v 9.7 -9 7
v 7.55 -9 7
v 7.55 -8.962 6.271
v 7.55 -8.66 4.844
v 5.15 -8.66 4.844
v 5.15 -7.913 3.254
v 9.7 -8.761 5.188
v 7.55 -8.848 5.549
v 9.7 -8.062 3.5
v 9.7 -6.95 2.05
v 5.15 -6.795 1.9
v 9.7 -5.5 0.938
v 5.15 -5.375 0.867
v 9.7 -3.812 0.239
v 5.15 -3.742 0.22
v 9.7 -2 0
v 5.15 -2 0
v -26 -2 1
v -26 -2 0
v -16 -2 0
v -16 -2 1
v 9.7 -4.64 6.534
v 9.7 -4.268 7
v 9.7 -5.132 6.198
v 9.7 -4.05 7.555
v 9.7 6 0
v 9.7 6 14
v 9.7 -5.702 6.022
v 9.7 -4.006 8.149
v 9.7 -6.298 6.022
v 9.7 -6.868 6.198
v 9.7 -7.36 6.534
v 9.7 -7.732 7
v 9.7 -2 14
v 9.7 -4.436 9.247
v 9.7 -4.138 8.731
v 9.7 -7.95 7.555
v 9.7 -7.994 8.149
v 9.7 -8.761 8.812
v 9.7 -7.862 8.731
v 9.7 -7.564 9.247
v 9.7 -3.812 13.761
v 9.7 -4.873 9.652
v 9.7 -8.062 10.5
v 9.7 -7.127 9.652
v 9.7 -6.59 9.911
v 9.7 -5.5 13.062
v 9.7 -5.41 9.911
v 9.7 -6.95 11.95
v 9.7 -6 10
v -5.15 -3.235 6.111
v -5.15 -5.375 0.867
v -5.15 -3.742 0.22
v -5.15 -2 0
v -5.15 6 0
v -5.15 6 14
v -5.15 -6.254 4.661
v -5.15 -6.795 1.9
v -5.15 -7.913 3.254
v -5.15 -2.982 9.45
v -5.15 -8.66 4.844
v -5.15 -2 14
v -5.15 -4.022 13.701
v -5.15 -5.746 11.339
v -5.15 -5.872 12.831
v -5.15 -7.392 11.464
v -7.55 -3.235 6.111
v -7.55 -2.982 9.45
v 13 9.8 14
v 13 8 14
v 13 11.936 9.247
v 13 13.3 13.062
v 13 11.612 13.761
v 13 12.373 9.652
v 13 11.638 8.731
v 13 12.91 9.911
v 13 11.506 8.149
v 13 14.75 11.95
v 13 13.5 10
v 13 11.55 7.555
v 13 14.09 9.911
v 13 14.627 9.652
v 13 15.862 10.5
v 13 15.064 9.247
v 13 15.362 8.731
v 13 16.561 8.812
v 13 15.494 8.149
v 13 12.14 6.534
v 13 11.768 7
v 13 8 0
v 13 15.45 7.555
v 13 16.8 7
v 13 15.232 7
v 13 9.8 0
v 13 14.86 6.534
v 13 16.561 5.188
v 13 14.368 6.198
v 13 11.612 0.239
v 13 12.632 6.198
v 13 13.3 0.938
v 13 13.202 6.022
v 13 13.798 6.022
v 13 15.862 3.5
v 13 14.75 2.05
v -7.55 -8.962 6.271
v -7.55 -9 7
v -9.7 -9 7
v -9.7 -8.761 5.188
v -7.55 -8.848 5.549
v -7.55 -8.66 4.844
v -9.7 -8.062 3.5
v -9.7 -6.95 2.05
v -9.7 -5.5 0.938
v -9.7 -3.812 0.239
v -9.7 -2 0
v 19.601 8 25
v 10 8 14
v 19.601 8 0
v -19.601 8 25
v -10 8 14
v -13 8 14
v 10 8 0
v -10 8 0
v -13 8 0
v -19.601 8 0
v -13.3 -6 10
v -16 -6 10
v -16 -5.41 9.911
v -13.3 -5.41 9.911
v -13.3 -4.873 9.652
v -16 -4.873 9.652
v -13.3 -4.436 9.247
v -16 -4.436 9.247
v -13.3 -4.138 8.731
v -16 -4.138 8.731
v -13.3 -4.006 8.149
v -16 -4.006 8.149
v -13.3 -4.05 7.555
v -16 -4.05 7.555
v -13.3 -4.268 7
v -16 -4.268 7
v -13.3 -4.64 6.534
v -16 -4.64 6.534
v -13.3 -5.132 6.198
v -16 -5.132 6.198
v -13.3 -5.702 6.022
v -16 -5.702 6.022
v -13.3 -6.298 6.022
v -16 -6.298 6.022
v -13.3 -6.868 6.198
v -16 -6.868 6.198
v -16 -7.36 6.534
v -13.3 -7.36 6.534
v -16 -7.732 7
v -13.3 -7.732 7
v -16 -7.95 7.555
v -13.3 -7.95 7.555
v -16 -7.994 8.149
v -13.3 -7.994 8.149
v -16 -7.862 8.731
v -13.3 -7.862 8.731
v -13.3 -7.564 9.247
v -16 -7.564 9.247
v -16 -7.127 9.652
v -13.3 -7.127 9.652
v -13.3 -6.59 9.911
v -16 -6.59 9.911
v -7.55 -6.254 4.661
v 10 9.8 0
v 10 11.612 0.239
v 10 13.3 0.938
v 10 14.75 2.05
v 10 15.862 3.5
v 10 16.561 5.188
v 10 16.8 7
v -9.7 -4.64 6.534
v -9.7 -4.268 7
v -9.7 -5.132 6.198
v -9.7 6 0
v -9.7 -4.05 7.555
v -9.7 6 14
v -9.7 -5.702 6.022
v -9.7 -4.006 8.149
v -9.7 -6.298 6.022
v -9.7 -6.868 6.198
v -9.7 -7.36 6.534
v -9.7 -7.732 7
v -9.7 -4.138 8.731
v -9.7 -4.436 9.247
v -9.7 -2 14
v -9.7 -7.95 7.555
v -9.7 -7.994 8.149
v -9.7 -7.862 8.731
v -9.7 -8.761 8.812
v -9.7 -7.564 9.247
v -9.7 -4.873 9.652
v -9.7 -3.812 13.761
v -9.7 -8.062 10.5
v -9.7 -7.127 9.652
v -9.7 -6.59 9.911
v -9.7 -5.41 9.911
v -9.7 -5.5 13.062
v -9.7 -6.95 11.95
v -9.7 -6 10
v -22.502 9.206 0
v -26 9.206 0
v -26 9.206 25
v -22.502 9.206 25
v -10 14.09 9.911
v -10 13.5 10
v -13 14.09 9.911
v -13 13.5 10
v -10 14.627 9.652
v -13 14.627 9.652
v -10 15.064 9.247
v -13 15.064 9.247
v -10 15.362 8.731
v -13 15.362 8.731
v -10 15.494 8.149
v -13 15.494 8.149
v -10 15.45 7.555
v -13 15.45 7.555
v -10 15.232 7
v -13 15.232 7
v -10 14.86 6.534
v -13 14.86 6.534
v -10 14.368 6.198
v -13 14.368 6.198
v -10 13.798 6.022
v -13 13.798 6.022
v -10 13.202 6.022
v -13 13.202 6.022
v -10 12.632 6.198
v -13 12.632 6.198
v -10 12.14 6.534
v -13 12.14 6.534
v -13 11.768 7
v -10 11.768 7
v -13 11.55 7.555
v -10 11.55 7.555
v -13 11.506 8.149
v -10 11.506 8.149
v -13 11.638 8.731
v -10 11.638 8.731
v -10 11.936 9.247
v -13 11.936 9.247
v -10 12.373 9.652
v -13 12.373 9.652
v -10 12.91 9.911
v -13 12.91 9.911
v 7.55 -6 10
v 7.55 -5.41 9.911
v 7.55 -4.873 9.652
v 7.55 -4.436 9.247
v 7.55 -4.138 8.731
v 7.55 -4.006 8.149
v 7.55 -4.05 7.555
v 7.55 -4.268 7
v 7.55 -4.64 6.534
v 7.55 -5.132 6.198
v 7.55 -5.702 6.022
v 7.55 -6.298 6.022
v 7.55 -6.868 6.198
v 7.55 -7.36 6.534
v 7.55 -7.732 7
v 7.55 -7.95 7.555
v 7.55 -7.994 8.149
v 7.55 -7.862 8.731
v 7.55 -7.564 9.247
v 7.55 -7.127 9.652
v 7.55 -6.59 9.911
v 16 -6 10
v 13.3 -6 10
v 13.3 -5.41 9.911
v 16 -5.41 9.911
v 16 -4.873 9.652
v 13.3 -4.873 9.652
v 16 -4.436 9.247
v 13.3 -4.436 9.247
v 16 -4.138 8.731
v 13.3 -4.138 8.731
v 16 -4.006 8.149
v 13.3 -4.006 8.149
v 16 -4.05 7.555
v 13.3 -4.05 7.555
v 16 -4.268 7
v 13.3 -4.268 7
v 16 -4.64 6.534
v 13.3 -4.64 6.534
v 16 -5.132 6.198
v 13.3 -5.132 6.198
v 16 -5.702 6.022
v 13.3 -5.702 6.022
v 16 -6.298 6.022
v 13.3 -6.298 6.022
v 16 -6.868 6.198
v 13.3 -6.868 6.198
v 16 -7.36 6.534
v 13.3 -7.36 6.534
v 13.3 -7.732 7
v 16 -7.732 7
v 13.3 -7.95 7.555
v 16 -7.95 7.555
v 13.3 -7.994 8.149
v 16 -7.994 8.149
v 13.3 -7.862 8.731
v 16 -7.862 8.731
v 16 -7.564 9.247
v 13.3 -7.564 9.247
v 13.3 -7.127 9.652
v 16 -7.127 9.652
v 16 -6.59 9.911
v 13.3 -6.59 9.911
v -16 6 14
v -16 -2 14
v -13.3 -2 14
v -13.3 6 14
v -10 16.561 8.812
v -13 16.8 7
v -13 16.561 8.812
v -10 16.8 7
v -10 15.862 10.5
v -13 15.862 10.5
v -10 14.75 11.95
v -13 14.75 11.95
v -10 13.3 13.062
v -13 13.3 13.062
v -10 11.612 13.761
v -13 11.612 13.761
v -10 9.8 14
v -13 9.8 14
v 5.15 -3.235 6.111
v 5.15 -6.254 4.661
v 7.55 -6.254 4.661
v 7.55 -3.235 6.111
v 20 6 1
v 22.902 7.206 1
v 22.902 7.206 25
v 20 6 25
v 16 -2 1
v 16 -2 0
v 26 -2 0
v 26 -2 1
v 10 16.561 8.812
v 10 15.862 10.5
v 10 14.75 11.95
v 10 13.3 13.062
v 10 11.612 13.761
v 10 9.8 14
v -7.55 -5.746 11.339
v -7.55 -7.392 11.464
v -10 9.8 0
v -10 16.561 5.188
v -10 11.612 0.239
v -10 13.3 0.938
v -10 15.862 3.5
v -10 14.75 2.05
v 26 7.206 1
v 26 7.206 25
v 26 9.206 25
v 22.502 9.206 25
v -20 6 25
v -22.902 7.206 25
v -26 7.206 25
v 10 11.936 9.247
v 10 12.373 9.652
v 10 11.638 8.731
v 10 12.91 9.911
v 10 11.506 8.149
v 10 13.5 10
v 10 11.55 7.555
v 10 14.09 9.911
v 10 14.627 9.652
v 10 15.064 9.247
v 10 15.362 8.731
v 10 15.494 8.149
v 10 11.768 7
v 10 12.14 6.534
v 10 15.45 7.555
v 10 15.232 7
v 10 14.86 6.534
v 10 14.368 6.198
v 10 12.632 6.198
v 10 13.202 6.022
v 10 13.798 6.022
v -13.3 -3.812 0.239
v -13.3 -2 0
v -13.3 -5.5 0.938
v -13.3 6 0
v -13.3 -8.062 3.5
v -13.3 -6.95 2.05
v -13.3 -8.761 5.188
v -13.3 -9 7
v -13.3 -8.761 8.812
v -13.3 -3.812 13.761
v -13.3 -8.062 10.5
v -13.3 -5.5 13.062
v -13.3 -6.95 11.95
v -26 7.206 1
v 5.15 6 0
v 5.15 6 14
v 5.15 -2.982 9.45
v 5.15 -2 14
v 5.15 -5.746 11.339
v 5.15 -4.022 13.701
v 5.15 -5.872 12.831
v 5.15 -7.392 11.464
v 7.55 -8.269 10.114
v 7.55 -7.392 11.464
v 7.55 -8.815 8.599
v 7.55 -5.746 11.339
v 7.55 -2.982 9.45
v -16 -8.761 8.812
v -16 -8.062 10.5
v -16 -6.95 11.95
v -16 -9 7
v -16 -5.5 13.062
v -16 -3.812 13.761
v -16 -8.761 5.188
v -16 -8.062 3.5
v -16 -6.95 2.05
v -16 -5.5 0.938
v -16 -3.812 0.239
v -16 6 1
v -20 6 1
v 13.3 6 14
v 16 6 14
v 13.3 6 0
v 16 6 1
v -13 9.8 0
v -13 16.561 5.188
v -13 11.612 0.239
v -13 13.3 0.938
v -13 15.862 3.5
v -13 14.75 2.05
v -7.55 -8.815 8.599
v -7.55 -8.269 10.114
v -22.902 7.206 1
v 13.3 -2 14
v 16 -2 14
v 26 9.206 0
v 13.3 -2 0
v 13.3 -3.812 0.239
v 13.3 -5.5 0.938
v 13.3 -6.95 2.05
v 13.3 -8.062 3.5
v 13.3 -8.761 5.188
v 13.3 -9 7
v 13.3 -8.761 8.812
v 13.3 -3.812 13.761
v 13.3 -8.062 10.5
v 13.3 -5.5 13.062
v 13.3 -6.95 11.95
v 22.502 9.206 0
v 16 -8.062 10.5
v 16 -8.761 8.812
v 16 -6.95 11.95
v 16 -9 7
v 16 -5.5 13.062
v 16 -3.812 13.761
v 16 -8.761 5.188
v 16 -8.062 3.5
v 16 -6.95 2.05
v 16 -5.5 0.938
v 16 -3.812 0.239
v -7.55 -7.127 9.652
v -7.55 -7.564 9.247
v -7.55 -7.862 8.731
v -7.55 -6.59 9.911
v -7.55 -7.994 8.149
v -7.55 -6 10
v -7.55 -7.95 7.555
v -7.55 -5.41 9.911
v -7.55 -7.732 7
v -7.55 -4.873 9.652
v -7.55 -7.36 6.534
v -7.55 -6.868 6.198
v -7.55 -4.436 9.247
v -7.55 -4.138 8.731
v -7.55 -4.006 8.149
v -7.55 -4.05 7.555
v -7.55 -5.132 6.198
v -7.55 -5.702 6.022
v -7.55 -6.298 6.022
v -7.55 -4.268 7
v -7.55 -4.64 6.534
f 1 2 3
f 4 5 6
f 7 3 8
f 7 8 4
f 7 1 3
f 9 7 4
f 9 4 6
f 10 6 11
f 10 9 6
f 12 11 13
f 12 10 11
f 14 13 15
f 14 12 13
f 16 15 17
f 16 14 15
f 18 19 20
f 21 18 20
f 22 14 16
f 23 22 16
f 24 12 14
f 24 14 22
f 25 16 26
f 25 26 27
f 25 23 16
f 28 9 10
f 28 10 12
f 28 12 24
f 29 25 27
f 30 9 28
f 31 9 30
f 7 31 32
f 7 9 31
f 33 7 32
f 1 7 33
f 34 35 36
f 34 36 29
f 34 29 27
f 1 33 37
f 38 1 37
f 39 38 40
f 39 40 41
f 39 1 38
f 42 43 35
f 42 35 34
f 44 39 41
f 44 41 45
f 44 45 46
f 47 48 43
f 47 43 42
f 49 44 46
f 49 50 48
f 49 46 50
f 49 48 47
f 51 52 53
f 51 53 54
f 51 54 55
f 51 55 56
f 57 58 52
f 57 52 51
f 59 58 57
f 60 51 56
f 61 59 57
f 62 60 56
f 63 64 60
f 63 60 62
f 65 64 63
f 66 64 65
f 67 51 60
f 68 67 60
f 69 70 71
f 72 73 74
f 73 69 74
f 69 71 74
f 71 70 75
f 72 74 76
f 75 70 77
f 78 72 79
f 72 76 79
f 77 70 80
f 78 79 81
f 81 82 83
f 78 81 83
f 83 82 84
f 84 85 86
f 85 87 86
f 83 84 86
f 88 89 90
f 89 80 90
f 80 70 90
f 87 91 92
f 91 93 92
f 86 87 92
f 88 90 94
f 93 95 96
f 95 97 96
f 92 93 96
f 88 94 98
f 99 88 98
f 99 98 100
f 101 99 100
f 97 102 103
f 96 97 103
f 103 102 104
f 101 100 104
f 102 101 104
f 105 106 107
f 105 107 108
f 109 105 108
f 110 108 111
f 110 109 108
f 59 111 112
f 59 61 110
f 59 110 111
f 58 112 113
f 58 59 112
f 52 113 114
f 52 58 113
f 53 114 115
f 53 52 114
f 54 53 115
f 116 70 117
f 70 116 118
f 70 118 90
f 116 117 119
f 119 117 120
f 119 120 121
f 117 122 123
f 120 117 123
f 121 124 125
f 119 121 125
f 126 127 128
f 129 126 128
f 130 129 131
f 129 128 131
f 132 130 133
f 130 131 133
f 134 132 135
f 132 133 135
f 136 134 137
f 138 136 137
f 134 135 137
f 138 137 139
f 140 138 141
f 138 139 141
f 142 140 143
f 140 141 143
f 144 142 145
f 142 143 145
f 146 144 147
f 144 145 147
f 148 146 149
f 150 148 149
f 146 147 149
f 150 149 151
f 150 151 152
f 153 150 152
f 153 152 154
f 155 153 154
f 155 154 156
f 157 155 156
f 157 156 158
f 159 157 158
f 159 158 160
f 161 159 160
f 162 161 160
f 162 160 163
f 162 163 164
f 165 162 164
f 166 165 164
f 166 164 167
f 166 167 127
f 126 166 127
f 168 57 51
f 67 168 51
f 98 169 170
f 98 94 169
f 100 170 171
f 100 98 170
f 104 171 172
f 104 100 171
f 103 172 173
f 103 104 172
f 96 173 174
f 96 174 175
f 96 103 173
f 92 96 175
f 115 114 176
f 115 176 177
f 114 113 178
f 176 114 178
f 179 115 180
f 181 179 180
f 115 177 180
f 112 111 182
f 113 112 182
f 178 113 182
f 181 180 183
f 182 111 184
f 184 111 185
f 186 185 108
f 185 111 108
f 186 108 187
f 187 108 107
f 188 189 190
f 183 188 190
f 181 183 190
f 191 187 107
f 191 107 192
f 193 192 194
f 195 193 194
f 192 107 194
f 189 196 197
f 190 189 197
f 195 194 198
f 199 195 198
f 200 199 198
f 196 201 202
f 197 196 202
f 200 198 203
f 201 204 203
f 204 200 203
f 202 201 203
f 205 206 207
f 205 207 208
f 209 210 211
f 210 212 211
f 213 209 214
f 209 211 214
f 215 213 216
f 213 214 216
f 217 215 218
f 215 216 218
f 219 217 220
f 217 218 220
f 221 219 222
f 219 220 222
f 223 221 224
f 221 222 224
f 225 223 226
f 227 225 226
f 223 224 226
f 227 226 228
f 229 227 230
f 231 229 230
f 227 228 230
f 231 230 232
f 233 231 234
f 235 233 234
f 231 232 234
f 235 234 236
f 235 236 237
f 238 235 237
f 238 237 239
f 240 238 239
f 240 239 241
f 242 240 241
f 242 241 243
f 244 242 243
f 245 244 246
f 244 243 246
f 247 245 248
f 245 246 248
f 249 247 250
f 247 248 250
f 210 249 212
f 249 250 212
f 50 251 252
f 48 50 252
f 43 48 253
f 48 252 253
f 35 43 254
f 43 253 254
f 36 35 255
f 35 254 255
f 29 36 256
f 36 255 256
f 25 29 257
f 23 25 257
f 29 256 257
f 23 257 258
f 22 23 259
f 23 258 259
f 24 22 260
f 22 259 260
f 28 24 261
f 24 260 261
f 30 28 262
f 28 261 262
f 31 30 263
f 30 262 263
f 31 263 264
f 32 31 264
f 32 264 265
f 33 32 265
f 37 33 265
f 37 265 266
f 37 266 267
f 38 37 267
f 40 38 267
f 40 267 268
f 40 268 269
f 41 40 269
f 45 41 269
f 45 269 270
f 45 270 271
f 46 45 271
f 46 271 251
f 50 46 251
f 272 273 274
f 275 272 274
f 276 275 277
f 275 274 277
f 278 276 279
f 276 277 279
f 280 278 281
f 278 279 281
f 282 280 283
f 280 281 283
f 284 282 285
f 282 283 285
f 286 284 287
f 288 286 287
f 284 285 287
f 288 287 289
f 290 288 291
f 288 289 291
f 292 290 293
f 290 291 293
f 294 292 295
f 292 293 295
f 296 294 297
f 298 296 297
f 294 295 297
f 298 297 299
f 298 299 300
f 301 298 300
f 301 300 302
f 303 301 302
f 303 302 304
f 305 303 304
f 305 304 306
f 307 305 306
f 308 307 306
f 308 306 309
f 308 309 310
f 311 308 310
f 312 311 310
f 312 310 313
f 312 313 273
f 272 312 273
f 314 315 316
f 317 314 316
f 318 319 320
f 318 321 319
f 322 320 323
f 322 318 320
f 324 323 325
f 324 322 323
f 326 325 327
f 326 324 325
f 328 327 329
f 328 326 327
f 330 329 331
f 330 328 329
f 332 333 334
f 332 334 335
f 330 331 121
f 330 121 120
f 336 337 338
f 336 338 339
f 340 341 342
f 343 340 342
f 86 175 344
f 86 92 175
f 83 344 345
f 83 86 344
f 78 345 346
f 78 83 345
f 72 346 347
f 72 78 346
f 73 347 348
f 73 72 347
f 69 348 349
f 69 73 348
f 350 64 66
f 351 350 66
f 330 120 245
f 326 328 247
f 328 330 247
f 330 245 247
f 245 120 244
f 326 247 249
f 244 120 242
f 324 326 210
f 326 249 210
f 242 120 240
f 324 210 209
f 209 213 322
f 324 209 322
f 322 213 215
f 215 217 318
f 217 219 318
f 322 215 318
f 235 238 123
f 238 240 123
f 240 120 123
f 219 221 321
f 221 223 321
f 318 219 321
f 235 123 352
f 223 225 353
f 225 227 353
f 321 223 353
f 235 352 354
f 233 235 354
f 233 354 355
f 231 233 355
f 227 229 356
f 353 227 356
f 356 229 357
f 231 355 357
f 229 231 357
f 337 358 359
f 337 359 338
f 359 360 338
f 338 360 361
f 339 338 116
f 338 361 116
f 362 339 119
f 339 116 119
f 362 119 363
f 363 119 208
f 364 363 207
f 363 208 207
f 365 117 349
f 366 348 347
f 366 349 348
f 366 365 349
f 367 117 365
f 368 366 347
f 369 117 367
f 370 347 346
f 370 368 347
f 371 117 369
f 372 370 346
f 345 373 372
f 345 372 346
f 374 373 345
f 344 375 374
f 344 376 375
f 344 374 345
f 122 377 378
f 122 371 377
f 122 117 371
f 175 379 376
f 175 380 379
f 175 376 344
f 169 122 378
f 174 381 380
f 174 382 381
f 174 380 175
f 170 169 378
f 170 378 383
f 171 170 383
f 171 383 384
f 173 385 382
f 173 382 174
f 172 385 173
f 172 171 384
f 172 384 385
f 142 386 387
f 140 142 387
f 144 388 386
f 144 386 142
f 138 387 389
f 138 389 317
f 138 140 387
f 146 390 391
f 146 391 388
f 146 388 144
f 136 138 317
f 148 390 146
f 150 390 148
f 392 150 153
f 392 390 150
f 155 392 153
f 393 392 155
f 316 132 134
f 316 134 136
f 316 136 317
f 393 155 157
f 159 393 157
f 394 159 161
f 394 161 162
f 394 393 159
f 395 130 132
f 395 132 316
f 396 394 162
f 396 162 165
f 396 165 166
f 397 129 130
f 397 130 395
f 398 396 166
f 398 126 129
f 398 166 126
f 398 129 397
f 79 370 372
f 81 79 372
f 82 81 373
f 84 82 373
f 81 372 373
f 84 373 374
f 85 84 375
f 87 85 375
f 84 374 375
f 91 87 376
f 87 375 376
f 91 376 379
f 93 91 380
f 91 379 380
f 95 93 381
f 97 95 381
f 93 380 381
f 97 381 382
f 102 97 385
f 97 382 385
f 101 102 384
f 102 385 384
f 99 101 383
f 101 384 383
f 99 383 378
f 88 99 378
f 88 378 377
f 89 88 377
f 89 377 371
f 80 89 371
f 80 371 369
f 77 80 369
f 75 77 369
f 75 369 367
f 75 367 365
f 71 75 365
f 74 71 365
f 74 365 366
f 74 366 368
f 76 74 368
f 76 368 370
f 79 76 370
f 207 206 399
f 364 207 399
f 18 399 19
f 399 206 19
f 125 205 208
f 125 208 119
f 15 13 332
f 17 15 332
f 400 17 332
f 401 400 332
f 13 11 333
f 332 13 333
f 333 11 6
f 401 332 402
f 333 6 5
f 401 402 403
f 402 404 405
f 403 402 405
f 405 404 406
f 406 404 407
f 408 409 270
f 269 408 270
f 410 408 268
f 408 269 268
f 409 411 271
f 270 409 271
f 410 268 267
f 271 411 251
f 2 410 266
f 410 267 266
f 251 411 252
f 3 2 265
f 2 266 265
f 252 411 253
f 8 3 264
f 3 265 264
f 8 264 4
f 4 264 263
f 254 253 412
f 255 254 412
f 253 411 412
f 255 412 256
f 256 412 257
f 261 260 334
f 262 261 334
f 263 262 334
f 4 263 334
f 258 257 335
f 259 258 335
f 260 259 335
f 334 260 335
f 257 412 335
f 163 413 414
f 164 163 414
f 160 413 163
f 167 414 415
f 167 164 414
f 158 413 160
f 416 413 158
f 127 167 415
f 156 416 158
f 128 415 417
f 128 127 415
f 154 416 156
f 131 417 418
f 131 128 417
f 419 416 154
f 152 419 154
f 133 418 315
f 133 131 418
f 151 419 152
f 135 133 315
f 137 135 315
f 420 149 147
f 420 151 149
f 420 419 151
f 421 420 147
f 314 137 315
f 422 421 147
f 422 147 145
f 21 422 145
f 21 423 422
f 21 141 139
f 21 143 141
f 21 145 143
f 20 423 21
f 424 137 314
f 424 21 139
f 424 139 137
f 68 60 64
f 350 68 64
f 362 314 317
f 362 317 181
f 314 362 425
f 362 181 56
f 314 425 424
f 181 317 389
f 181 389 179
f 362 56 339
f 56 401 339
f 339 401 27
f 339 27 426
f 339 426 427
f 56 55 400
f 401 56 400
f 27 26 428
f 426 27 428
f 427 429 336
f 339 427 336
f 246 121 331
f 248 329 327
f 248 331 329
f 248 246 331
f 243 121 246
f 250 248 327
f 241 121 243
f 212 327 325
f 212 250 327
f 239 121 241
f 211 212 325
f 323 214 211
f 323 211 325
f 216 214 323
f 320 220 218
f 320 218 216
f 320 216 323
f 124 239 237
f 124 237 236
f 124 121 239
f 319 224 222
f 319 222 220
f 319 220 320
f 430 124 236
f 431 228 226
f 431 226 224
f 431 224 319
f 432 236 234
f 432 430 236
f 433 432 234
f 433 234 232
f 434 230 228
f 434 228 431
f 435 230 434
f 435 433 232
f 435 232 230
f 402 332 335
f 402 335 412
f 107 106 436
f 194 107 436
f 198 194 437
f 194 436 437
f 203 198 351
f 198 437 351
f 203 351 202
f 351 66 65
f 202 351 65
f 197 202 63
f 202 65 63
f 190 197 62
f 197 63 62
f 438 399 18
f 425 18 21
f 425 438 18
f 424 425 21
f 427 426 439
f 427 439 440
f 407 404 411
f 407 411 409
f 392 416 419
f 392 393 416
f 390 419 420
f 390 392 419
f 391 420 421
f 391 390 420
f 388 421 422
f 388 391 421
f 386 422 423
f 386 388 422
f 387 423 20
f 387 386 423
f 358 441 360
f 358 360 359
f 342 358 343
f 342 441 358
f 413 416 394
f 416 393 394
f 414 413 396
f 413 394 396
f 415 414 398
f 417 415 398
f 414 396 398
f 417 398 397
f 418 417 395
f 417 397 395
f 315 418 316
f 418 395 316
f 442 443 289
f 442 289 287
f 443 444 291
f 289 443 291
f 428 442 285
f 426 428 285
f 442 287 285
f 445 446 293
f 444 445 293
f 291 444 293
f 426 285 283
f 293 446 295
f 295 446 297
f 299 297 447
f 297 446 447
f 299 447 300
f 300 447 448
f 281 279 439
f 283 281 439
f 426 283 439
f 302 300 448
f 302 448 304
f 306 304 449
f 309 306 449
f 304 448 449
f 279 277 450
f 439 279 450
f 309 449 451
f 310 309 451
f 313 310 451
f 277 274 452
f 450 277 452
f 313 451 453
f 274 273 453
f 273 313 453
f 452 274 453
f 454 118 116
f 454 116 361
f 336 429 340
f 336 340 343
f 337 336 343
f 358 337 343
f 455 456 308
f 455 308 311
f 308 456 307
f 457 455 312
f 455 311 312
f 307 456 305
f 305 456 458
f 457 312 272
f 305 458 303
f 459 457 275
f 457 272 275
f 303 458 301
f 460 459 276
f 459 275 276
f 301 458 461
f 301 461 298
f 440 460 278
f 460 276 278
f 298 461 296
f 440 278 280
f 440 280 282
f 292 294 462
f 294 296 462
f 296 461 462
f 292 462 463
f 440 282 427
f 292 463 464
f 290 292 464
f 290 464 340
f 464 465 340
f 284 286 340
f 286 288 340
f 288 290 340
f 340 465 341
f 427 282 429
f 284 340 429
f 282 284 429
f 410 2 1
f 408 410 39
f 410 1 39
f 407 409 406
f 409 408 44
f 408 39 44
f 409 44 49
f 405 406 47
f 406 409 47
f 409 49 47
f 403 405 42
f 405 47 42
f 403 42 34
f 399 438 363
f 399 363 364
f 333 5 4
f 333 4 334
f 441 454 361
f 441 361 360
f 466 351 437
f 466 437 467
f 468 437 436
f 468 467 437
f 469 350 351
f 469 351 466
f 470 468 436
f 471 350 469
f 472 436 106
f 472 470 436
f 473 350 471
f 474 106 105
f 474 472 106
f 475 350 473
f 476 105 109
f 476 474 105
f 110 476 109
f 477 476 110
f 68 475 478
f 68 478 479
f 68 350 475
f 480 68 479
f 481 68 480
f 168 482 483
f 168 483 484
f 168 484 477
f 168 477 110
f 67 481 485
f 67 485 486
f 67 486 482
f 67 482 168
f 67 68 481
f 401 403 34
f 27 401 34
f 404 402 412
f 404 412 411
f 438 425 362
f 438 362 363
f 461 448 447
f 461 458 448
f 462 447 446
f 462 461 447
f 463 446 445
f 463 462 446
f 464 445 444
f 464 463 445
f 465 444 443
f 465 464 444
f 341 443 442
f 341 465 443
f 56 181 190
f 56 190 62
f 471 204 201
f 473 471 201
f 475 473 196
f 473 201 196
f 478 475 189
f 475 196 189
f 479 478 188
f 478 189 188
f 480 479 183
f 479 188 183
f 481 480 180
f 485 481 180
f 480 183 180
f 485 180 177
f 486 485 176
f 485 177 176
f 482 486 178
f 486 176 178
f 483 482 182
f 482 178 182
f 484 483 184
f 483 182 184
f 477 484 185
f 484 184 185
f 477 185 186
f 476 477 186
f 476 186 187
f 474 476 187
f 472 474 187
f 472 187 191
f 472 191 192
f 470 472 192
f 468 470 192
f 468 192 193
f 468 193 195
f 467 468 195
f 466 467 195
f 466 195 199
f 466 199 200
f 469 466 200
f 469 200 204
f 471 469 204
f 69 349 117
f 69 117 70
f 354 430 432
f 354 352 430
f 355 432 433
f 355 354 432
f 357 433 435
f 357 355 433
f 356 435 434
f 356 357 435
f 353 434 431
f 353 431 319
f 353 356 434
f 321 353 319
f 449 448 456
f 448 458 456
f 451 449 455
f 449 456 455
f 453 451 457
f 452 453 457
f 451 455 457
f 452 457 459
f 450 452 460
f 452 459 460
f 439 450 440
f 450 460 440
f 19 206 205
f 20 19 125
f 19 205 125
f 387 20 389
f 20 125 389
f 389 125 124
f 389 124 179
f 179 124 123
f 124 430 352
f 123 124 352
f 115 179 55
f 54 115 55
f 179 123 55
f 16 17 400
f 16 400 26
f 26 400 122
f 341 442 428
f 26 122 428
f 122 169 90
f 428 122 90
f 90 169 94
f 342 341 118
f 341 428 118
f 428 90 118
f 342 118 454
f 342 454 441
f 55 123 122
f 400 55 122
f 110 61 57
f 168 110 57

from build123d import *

# Parameters (mm, degrees)
SKETCH2_W                 = 5
SKETCH2_H                 = 15
BOSS_EXTRUDE1_DEPTH       = 14
BOSS_EXTRUDE1_2_DEPTH     = 14
BOSS_EXTRUDE3_DEPTH       = 25
SKETCH5_W                 = 3
SKETCH5_H                 = 8.8
BOSS_EXTRUDE4_DEPTH       = 14
SKETCH7_W                 = 3
SKETCH7_H                 = 15
BOSS_EXTRUDE5_DEPTH       = 14
SKETCH15_W                = 0.3
SKETCH15_H                = 14
CUT_EXTRUDE2_DEPTH        = 15
SKETCH16_W                = 0.15
SKETCH16_H                = 14
CUT_EXTRUDE3_DEPTH        = 15
FILLET1_R                 = 7
F_4_0MM_DOWEL_HOLE2_D     = 4
FILLET2_R                 = 7
F_4_0MM_DOWEL_HOLE1_D     = 4
F_4_0MM_DOWEL_HOLE1_DEPTH = 26
F_4_0MM_DOWEL_HOLE1_TIP   = 1.201721238
BOSS_EXTRUDE6_DEPTH       = 1
CUT_EXTRUDE4_DEPTH        = 2.4


with BuildPart() as part:
    # Sketch2 → Boss-Extrude1 (new body)
    with BuildSketch(Plane.XY):
        with Locations((-7.5, -1.5)):
            Rectangle(SKETCH2_W, SKETCH2_H)
    extrude(amount=BOSS_EXTRUDE1_DEPTH)



with BuildPart() as body_2:
    # Sketch2 → Boss-Extrude1 2 (new body)
    with BuildSketch(Plane.XY):
        with Locations((7.5, -1.5)):
            Rectangle(SKETCH2_W, SKETCH2_H)
    extrude(amount=BOSS_EXTRUDE1_2_DEPTH)


with BuildPart() as part_1:
    add(part.part)

    add(body_2.part)  # Boss-Extrude3 merges body 2
    # Sketch4 → Boss-Extrude3 (add)
    with BuildSketch(Plane.XY):
        Polygon((-10, 6), (-20, 6), (-22.901603942, 7.206366686), (-26, 7.206366686), (-26, 9.206366686), (-22.502408858, 9.206366686), (-19.600804916, 8), (-10, 8), (10, 8), (19.600804916, 8), (22.502408858, 9.206366686), (26, 9.206366686), (26, 7.206366686), (22.901603942, 7.206366686), (20, 6), (10, 6), align=None)
    extrude(amount=BOSS_EXTRUDE3_DEPTH)

    # Sketch5 → Boss-Extrude4 (add)
    with BuildSketch(Plane.XY):
        with Locations((-11.5, 12.4)):
            Rectangle(SKETCH5_W, SKETCH5_H)
        with Locations((11.5, 12.4)):
            Rectangle(SKETCH5_W, SKETCH5_H)
    extrude(amount=BOSS_EXTRUDE4_DEPTH)

    # Sketch7 → Boss-Extrude5 (add)
    with BuildSketch(Plane.XY):
        with Locations((-14.5, -1.5)):
            Rectangle(SKETCH7_W, SKETCH7_H)
        with Locations((14.5, -1.5)):
            Rectangle(SKETCH7_W, SKETCH7_H)
    extrude(amount=BOSS_EXTRUDE5_DEPTH)

    # Sketch15 → Cut-Extrude2 (cut)
    with BuildSketch(Plane.XZ.offset(9)):
        with Locations((-9.85, 7)):
            Rectangle(SKETCH15_W, SKETCH15_H)
        with Locations((9.85, 7)):
            Rectangle(SKETCH15_W, SKETCH15_H)
        with Locations((-13.15, 7)):
            Rectangle(SKETCH15_W, SKETCH15_H)
        with Locations((13.15, 7)):
            Rectangle(SKETCH15_W, SKETCH15_H)
    extrude(amount=-CUT_EXTRUDE2_DEPTH, mode=Mode.SUBTRACT)

    # Sketch16 → Cut-Extrude3 (cut)
    with BuildSketch(Plane.XZ.offset(9)):
        with Locations((-5.075, 7)):
            Rectangle(SKETCH16_W, SKETCH16_H)
        with Locations((5.075, 7)):
            Rectangle(SKETCH16_W, SKETCH16_H)
    extrude(amount=-CUT_EXTRUDE3_DEPTH, mode=Mode.SUBTRACT)

    # Fillet1
    fillet1_edges = [part_1.edges().sort_by_distance(p)[0] for p in [
        (7.425, -9, 0),
        (7.425, -9, 14),
        (-7.425, -9, 0),
        (-7.425, -9, 14),
        (-14.65, -9, 0),
        (-14.65, -9, 14),
        (14.65, -9, 14),
        (14.65, -9, 0),
    ]]
    fillet(fillet1_edges, radius=FILLET1_R - 0.0001)  # a hair under: the kernel refuses the full size

    # Ø4.0mm Dowel Hole2 (through all)
    with Locations(Plane(origin=(16, 0, 0), x_dir=(0, 0, -1), z_dir=(1, 0, 0))):
        with Locations((-8, -6)):
            Hole(F_4_0MM_DOWEL_HOLE2_D / 2)

    # Fillet2
    fillet2_edges = [part_1.edges().sort_by_distance(p)[0] for p in [
        (-11.5, 16.8, 0),
        (-11.5, 16.8, 14),
        (11.5, 16.8, 0),
        (11.5, 16.8, 14),
    ]]
    fillet(fillet2_edges, radius=FILLET2_R - 0.0001)  # a hair under: the kernel refuses the full size

    # Ø4.0mm Dowel Hole1
    with Locations(Plane(origin=(13, 0, 0), x_dir=(0, 0, -1), z_dir=(1, 0, 0))):
        with Locations((-8, 13.5)):
            Hole(F_4_0MM_DOWEL_HOLE1_D / 2, depth=F_4_0MM_DOWEL_HOLE1_DEPTH)
            with Locations((0, 0, -(F_4_0MM_DOWEL_HOLE1_DEPTH + F_4_0MM_DOWEL_HOLE1_TIP / 2))):  # 118° drill point
                Cone(0, F_4_0MM_DOWEL_HOLE1_D / 2, F_4_0MM_DOWEL_HOLE1_TIP, mode=Mode.SUBTRACT)

    # Sketch14 → Boss-Extrude6 (add)
    with BuildSketch(Plane.XY):
        Polygon((-22.901603942, 7.206366686), (-26, 7.206366686), (-26, -2), (-16, -2), (-16, 6), (-20, 6), align=None)
        Polygon((20, 6), (16, 6), (16, -2), (26, -2), (26, 7.206366686), (22.901603942, 7.206366686), align=None)
    extrude(amount=BOSS_EXTRUDE6_DEPTH)

    # Sketch18 → Cut-Extrude4 (cut)
    with BuildSketch(Plane(origin=(-5.15, 0, 0), x_dir=(0, 0, -1), z_dir=(1, 0, 0))):
        Polygon((-6.110899152, -3.235107358), (-9.449916842, -2.981544355), (-11.33901769, -5.746436996), (-12.466071308, -20.587923763), (-5.788035927, -21.095049771), (-4.66098231, -6.253563004), align=None)
    cut_extrude4 = extrude(amount=-CUT_EXTRUDE4_DEPTH, mode=Mode.SUBTRACT)

    # Mirror1: Cut-Extrude4 across plane
    add(cut_extrude4.mirror(Plane(origin=(0, 0, 0), x_dir=(0, 0, 1), z_dir=(1, 0, 0))), mode=Mode.SUBTRACT)


solid = part_1.part
